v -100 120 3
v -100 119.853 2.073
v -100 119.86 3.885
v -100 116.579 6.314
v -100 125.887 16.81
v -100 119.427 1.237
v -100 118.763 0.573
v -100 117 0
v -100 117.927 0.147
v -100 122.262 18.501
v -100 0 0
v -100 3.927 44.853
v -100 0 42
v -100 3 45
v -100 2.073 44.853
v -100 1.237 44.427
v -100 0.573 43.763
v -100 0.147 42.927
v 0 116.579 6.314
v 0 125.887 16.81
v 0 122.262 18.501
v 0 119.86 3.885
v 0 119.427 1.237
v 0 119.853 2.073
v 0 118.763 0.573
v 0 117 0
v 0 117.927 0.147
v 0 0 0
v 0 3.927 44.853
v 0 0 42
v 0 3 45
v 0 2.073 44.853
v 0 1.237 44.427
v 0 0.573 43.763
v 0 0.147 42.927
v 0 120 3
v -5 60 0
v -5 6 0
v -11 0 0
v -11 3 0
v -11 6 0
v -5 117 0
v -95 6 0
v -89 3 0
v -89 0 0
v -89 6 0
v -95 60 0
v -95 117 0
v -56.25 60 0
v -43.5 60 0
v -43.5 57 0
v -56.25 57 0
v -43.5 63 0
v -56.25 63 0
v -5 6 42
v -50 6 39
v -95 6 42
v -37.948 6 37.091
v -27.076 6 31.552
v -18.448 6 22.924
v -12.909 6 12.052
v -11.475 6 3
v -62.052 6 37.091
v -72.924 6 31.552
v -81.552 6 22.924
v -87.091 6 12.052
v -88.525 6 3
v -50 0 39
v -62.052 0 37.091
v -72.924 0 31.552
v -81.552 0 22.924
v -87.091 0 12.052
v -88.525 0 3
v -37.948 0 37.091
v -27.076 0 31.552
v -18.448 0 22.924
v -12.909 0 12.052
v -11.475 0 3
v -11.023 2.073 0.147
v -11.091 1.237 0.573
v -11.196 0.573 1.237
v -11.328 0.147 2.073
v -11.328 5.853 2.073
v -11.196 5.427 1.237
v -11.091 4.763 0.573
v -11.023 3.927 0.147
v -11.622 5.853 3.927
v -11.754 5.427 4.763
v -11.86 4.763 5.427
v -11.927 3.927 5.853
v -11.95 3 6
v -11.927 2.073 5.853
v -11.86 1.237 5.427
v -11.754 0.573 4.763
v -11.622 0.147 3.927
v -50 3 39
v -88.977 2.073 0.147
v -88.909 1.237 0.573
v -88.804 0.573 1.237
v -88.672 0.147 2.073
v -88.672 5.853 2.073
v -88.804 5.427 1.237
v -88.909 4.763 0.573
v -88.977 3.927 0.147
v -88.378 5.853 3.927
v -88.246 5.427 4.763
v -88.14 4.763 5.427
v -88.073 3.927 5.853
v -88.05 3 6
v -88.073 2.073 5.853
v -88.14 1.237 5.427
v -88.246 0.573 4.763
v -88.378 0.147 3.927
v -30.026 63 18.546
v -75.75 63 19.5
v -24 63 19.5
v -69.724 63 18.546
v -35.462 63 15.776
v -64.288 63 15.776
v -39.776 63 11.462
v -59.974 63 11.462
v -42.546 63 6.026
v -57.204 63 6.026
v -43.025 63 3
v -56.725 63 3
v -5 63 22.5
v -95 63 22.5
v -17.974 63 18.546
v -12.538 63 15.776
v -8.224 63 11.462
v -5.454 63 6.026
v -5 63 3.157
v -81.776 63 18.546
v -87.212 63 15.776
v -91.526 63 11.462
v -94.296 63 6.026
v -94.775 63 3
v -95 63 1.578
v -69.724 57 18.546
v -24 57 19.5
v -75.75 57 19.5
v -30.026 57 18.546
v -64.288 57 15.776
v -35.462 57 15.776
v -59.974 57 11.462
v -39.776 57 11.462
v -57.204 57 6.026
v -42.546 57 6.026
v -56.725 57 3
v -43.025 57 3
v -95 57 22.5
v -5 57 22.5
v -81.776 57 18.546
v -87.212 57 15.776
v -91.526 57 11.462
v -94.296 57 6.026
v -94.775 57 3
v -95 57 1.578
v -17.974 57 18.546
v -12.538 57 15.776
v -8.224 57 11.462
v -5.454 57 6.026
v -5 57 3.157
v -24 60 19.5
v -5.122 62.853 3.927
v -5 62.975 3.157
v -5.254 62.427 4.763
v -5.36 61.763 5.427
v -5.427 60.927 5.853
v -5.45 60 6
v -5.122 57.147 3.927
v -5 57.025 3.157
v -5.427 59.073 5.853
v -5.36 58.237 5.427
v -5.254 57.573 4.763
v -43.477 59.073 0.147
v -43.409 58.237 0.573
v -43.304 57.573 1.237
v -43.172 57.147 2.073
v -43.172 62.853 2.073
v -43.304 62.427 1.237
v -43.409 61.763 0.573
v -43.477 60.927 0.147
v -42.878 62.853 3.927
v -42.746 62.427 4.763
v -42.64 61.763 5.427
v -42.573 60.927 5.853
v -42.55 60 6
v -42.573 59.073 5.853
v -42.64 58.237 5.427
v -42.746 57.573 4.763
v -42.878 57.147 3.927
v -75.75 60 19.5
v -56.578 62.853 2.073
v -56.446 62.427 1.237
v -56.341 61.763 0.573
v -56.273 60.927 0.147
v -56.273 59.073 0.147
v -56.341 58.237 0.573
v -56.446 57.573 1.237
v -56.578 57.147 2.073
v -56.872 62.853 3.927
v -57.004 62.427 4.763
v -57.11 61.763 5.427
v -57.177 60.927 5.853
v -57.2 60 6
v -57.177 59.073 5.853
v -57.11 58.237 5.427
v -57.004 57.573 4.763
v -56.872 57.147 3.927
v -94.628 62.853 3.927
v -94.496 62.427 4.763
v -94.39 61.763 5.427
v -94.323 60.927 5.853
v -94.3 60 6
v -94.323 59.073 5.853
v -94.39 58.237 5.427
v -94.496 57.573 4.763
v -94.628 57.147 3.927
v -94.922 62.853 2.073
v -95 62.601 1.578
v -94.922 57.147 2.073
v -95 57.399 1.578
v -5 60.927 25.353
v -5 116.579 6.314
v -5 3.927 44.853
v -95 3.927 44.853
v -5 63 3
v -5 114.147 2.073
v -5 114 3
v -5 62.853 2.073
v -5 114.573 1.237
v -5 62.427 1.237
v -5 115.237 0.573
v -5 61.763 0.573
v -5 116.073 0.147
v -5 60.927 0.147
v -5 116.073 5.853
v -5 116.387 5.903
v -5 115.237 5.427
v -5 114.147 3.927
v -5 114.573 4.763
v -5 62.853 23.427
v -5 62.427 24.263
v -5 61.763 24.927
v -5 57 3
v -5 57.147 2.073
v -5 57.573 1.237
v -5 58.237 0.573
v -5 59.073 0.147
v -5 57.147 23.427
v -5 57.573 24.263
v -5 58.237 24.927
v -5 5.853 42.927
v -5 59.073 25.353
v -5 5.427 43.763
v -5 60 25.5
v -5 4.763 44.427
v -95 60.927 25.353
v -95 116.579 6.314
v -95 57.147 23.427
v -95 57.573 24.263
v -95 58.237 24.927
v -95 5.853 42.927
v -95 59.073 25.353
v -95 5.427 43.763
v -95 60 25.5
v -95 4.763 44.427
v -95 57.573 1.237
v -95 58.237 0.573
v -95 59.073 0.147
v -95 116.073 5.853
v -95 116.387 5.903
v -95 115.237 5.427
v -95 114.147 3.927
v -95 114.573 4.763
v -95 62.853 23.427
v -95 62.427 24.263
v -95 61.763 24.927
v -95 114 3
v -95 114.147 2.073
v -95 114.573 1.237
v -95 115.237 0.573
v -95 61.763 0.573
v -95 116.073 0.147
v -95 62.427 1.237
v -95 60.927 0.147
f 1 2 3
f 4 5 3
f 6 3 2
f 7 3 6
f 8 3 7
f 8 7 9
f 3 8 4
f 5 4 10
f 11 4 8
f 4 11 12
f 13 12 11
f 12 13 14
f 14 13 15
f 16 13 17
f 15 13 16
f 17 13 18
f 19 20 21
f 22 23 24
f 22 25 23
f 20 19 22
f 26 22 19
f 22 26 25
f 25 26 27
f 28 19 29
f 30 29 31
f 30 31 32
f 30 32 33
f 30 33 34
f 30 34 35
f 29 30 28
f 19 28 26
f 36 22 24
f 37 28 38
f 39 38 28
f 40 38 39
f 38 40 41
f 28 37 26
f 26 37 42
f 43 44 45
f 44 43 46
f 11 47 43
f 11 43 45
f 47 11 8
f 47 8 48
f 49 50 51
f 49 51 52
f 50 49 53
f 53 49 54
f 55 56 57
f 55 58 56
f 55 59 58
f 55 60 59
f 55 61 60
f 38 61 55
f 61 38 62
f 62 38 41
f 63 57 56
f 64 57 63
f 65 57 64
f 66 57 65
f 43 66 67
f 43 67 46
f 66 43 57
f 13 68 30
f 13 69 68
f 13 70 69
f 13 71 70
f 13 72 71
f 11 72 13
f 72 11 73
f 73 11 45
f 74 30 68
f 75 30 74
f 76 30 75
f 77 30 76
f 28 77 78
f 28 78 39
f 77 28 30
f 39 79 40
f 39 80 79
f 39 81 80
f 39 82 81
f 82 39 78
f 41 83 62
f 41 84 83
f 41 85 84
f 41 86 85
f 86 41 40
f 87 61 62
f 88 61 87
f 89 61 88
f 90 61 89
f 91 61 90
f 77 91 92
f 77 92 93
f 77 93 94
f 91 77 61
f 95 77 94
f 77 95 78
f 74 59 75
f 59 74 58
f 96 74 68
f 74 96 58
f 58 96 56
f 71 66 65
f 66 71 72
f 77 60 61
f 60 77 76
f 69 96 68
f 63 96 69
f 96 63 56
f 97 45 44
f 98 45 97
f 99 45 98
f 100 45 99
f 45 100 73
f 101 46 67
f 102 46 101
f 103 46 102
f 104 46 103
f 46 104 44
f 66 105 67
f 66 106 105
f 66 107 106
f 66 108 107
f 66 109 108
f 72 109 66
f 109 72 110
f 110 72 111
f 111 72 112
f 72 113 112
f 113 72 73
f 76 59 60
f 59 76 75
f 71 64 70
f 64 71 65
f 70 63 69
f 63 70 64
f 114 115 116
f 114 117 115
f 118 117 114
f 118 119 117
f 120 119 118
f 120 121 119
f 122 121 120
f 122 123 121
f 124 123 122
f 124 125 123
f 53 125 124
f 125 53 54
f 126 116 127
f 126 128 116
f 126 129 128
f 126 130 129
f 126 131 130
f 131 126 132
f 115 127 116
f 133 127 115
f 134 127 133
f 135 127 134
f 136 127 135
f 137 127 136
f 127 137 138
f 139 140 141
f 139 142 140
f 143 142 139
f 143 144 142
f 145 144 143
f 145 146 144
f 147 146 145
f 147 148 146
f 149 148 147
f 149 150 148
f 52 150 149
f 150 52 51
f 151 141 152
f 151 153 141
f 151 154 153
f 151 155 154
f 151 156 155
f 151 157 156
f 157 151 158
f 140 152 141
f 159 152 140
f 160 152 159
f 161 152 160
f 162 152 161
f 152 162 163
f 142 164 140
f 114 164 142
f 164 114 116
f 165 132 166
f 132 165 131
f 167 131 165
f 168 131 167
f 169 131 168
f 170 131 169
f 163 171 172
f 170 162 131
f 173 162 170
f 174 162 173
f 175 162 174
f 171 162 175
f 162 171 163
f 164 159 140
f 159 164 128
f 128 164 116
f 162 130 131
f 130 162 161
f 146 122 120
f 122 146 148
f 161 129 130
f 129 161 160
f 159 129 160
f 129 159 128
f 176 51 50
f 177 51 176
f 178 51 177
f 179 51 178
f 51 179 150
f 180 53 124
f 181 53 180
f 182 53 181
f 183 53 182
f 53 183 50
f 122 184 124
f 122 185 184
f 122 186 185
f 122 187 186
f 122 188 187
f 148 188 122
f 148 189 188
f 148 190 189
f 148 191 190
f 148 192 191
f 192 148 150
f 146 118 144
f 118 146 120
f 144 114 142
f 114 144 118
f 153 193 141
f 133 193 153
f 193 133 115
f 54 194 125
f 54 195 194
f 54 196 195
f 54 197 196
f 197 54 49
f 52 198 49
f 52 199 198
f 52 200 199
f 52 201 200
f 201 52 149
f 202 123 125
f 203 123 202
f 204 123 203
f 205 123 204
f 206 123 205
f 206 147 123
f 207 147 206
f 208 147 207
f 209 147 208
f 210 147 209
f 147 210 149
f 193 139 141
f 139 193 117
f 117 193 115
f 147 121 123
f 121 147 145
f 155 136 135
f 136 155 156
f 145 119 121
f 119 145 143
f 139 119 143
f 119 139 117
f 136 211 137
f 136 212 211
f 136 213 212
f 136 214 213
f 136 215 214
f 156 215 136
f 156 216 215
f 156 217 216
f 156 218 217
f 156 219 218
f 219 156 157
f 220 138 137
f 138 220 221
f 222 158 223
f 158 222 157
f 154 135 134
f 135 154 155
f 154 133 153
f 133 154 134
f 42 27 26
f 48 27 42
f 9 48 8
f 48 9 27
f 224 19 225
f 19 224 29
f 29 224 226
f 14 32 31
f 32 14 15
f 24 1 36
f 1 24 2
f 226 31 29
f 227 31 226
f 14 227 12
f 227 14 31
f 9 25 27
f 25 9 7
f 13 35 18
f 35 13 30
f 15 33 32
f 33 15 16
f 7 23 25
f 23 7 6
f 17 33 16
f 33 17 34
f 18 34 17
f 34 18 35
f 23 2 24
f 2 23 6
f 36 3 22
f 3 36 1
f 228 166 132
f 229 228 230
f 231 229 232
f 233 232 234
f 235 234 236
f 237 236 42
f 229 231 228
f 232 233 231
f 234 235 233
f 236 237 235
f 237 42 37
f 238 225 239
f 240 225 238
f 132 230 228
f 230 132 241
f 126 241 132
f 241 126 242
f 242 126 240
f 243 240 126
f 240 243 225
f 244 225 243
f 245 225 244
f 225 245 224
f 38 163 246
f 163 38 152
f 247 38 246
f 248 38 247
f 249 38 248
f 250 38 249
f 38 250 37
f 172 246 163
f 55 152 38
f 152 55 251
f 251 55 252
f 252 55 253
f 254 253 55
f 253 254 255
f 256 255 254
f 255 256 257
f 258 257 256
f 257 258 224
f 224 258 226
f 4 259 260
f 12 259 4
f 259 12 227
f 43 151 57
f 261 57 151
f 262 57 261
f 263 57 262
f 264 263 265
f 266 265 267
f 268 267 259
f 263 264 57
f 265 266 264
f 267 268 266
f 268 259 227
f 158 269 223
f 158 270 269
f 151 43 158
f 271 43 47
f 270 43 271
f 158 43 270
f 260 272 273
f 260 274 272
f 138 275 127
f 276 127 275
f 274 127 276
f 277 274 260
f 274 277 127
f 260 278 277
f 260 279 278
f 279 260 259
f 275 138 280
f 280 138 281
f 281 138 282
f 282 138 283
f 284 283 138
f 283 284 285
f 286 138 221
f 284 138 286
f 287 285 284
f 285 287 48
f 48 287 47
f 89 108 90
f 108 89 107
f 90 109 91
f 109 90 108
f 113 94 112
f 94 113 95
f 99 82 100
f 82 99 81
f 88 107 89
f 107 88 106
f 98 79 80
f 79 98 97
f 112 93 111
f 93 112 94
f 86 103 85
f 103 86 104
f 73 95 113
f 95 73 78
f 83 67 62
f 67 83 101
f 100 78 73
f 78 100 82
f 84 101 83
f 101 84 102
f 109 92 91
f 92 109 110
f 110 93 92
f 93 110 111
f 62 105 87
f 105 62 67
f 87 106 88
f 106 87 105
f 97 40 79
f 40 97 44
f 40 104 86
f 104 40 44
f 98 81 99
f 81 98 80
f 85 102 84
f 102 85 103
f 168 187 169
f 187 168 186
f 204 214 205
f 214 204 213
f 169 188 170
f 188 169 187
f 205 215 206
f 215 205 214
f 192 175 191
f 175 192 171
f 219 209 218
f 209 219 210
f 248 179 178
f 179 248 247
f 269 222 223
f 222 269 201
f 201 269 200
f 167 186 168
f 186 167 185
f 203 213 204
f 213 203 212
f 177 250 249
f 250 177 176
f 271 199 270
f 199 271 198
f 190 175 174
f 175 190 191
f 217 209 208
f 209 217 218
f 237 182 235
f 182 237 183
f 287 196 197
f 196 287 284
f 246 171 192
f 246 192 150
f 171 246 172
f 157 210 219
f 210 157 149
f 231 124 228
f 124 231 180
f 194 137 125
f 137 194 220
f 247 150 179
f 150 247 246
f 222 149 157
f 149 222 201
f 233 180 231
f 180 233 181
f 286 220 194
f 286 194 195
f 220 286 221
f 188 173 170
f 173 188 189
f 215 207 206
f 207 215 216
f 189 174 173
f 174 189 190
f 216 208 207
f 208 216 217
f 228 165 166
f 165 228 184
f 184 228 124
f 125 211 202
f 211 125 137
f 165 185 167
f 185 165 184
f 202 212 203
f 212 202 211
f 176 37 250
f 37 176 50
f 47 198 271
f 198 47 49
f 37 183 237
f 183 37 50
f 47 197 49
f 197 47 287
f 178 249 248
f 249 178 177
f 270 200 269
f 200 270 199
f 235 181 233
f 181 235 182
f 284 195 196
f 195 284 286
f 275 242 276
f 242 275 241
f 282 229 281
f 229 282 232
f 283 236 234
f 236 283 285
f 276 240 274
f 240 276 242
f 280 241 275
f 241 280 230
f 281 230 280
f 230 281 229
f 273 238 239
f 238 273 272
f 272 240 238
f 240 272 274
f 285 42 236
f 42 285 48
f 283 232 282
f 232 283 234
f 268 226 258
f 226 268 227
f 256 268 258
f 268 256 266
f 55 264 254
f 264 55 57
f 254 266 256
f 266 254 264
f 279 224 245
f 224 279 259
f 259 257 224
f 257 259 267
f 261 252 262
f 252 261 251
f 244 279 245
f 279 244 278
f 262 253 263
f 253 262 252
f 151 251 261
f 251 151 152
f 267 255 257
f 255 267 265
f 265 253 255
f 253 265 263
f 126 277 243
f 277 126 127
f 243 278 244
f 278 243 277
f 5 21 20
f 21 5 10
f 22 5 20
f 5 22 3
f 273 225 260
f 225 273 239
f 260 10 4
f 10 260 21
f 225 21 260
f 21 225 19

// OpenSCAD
module right_triangle(side1,side2,corner_radius,triangle_height){
    translate([corner_radius,corner_radius,0]){  
        hull(){  
        cylinder(r=corner_radius,h=triangle_height);
          translate([side1 - corner_radius * 2,0,0])cylinder(r=corner_radius,h=triangle_height);
              translate([0,side2 - corner_radius * 2,0])cylinder(r=corner_radius,h=triangle_height);  
        }
    }
}
$fn=20;


t=5;
r=3;
h=45;
w=120;
s=100;

rotate([0, -90, 0]) {
    translate([0, 0, 0])
    right_triangle(h, w, r, t);
    translate([0, 0, s-t])
    right_triangle(h, w, r, t);

    translate([r, r, 0]) cylinder(h=s, r=r);
    translate([r, w/2, 0]) cylinder(h=s, r=r);
    translate([r, w-r, 0]) cylinder(h=s, r=r);

    translate([h-r, r, 0]) cylinder(h=s, r=r);
    difference() {
        translate([0, 0, 0]) cube([h-r, r*2, s]);
        translate([0, -r*.05, s/2]) 
            rotate([0, 90, 90]) cylinder(h=r*2.1, r=h-r*2);
    }

    translate([h/2, w/2, 0]) cylinder(h=s, r=r);
    difference()
    {
        translate([0, w/2-r, 0]) cube([h/2, r*2, s]);
        {
            translate([0, w/2-r*1.05, h/2+r/2]) 
                rotate([0, 90, 90]) cylinder(h=r*2.1, r=h/2-r);
            translate([0, w/2-r*1.05, h/2-r*2.25+w/2]) 
                rotate([0, 90, 90]) cylinder(h=r*2.1, r=h/2-r);
        }
    }

    translate([4, w-4.5, 0]) rotate([0, 0, 25]) cube([16, 4, s]);
}
